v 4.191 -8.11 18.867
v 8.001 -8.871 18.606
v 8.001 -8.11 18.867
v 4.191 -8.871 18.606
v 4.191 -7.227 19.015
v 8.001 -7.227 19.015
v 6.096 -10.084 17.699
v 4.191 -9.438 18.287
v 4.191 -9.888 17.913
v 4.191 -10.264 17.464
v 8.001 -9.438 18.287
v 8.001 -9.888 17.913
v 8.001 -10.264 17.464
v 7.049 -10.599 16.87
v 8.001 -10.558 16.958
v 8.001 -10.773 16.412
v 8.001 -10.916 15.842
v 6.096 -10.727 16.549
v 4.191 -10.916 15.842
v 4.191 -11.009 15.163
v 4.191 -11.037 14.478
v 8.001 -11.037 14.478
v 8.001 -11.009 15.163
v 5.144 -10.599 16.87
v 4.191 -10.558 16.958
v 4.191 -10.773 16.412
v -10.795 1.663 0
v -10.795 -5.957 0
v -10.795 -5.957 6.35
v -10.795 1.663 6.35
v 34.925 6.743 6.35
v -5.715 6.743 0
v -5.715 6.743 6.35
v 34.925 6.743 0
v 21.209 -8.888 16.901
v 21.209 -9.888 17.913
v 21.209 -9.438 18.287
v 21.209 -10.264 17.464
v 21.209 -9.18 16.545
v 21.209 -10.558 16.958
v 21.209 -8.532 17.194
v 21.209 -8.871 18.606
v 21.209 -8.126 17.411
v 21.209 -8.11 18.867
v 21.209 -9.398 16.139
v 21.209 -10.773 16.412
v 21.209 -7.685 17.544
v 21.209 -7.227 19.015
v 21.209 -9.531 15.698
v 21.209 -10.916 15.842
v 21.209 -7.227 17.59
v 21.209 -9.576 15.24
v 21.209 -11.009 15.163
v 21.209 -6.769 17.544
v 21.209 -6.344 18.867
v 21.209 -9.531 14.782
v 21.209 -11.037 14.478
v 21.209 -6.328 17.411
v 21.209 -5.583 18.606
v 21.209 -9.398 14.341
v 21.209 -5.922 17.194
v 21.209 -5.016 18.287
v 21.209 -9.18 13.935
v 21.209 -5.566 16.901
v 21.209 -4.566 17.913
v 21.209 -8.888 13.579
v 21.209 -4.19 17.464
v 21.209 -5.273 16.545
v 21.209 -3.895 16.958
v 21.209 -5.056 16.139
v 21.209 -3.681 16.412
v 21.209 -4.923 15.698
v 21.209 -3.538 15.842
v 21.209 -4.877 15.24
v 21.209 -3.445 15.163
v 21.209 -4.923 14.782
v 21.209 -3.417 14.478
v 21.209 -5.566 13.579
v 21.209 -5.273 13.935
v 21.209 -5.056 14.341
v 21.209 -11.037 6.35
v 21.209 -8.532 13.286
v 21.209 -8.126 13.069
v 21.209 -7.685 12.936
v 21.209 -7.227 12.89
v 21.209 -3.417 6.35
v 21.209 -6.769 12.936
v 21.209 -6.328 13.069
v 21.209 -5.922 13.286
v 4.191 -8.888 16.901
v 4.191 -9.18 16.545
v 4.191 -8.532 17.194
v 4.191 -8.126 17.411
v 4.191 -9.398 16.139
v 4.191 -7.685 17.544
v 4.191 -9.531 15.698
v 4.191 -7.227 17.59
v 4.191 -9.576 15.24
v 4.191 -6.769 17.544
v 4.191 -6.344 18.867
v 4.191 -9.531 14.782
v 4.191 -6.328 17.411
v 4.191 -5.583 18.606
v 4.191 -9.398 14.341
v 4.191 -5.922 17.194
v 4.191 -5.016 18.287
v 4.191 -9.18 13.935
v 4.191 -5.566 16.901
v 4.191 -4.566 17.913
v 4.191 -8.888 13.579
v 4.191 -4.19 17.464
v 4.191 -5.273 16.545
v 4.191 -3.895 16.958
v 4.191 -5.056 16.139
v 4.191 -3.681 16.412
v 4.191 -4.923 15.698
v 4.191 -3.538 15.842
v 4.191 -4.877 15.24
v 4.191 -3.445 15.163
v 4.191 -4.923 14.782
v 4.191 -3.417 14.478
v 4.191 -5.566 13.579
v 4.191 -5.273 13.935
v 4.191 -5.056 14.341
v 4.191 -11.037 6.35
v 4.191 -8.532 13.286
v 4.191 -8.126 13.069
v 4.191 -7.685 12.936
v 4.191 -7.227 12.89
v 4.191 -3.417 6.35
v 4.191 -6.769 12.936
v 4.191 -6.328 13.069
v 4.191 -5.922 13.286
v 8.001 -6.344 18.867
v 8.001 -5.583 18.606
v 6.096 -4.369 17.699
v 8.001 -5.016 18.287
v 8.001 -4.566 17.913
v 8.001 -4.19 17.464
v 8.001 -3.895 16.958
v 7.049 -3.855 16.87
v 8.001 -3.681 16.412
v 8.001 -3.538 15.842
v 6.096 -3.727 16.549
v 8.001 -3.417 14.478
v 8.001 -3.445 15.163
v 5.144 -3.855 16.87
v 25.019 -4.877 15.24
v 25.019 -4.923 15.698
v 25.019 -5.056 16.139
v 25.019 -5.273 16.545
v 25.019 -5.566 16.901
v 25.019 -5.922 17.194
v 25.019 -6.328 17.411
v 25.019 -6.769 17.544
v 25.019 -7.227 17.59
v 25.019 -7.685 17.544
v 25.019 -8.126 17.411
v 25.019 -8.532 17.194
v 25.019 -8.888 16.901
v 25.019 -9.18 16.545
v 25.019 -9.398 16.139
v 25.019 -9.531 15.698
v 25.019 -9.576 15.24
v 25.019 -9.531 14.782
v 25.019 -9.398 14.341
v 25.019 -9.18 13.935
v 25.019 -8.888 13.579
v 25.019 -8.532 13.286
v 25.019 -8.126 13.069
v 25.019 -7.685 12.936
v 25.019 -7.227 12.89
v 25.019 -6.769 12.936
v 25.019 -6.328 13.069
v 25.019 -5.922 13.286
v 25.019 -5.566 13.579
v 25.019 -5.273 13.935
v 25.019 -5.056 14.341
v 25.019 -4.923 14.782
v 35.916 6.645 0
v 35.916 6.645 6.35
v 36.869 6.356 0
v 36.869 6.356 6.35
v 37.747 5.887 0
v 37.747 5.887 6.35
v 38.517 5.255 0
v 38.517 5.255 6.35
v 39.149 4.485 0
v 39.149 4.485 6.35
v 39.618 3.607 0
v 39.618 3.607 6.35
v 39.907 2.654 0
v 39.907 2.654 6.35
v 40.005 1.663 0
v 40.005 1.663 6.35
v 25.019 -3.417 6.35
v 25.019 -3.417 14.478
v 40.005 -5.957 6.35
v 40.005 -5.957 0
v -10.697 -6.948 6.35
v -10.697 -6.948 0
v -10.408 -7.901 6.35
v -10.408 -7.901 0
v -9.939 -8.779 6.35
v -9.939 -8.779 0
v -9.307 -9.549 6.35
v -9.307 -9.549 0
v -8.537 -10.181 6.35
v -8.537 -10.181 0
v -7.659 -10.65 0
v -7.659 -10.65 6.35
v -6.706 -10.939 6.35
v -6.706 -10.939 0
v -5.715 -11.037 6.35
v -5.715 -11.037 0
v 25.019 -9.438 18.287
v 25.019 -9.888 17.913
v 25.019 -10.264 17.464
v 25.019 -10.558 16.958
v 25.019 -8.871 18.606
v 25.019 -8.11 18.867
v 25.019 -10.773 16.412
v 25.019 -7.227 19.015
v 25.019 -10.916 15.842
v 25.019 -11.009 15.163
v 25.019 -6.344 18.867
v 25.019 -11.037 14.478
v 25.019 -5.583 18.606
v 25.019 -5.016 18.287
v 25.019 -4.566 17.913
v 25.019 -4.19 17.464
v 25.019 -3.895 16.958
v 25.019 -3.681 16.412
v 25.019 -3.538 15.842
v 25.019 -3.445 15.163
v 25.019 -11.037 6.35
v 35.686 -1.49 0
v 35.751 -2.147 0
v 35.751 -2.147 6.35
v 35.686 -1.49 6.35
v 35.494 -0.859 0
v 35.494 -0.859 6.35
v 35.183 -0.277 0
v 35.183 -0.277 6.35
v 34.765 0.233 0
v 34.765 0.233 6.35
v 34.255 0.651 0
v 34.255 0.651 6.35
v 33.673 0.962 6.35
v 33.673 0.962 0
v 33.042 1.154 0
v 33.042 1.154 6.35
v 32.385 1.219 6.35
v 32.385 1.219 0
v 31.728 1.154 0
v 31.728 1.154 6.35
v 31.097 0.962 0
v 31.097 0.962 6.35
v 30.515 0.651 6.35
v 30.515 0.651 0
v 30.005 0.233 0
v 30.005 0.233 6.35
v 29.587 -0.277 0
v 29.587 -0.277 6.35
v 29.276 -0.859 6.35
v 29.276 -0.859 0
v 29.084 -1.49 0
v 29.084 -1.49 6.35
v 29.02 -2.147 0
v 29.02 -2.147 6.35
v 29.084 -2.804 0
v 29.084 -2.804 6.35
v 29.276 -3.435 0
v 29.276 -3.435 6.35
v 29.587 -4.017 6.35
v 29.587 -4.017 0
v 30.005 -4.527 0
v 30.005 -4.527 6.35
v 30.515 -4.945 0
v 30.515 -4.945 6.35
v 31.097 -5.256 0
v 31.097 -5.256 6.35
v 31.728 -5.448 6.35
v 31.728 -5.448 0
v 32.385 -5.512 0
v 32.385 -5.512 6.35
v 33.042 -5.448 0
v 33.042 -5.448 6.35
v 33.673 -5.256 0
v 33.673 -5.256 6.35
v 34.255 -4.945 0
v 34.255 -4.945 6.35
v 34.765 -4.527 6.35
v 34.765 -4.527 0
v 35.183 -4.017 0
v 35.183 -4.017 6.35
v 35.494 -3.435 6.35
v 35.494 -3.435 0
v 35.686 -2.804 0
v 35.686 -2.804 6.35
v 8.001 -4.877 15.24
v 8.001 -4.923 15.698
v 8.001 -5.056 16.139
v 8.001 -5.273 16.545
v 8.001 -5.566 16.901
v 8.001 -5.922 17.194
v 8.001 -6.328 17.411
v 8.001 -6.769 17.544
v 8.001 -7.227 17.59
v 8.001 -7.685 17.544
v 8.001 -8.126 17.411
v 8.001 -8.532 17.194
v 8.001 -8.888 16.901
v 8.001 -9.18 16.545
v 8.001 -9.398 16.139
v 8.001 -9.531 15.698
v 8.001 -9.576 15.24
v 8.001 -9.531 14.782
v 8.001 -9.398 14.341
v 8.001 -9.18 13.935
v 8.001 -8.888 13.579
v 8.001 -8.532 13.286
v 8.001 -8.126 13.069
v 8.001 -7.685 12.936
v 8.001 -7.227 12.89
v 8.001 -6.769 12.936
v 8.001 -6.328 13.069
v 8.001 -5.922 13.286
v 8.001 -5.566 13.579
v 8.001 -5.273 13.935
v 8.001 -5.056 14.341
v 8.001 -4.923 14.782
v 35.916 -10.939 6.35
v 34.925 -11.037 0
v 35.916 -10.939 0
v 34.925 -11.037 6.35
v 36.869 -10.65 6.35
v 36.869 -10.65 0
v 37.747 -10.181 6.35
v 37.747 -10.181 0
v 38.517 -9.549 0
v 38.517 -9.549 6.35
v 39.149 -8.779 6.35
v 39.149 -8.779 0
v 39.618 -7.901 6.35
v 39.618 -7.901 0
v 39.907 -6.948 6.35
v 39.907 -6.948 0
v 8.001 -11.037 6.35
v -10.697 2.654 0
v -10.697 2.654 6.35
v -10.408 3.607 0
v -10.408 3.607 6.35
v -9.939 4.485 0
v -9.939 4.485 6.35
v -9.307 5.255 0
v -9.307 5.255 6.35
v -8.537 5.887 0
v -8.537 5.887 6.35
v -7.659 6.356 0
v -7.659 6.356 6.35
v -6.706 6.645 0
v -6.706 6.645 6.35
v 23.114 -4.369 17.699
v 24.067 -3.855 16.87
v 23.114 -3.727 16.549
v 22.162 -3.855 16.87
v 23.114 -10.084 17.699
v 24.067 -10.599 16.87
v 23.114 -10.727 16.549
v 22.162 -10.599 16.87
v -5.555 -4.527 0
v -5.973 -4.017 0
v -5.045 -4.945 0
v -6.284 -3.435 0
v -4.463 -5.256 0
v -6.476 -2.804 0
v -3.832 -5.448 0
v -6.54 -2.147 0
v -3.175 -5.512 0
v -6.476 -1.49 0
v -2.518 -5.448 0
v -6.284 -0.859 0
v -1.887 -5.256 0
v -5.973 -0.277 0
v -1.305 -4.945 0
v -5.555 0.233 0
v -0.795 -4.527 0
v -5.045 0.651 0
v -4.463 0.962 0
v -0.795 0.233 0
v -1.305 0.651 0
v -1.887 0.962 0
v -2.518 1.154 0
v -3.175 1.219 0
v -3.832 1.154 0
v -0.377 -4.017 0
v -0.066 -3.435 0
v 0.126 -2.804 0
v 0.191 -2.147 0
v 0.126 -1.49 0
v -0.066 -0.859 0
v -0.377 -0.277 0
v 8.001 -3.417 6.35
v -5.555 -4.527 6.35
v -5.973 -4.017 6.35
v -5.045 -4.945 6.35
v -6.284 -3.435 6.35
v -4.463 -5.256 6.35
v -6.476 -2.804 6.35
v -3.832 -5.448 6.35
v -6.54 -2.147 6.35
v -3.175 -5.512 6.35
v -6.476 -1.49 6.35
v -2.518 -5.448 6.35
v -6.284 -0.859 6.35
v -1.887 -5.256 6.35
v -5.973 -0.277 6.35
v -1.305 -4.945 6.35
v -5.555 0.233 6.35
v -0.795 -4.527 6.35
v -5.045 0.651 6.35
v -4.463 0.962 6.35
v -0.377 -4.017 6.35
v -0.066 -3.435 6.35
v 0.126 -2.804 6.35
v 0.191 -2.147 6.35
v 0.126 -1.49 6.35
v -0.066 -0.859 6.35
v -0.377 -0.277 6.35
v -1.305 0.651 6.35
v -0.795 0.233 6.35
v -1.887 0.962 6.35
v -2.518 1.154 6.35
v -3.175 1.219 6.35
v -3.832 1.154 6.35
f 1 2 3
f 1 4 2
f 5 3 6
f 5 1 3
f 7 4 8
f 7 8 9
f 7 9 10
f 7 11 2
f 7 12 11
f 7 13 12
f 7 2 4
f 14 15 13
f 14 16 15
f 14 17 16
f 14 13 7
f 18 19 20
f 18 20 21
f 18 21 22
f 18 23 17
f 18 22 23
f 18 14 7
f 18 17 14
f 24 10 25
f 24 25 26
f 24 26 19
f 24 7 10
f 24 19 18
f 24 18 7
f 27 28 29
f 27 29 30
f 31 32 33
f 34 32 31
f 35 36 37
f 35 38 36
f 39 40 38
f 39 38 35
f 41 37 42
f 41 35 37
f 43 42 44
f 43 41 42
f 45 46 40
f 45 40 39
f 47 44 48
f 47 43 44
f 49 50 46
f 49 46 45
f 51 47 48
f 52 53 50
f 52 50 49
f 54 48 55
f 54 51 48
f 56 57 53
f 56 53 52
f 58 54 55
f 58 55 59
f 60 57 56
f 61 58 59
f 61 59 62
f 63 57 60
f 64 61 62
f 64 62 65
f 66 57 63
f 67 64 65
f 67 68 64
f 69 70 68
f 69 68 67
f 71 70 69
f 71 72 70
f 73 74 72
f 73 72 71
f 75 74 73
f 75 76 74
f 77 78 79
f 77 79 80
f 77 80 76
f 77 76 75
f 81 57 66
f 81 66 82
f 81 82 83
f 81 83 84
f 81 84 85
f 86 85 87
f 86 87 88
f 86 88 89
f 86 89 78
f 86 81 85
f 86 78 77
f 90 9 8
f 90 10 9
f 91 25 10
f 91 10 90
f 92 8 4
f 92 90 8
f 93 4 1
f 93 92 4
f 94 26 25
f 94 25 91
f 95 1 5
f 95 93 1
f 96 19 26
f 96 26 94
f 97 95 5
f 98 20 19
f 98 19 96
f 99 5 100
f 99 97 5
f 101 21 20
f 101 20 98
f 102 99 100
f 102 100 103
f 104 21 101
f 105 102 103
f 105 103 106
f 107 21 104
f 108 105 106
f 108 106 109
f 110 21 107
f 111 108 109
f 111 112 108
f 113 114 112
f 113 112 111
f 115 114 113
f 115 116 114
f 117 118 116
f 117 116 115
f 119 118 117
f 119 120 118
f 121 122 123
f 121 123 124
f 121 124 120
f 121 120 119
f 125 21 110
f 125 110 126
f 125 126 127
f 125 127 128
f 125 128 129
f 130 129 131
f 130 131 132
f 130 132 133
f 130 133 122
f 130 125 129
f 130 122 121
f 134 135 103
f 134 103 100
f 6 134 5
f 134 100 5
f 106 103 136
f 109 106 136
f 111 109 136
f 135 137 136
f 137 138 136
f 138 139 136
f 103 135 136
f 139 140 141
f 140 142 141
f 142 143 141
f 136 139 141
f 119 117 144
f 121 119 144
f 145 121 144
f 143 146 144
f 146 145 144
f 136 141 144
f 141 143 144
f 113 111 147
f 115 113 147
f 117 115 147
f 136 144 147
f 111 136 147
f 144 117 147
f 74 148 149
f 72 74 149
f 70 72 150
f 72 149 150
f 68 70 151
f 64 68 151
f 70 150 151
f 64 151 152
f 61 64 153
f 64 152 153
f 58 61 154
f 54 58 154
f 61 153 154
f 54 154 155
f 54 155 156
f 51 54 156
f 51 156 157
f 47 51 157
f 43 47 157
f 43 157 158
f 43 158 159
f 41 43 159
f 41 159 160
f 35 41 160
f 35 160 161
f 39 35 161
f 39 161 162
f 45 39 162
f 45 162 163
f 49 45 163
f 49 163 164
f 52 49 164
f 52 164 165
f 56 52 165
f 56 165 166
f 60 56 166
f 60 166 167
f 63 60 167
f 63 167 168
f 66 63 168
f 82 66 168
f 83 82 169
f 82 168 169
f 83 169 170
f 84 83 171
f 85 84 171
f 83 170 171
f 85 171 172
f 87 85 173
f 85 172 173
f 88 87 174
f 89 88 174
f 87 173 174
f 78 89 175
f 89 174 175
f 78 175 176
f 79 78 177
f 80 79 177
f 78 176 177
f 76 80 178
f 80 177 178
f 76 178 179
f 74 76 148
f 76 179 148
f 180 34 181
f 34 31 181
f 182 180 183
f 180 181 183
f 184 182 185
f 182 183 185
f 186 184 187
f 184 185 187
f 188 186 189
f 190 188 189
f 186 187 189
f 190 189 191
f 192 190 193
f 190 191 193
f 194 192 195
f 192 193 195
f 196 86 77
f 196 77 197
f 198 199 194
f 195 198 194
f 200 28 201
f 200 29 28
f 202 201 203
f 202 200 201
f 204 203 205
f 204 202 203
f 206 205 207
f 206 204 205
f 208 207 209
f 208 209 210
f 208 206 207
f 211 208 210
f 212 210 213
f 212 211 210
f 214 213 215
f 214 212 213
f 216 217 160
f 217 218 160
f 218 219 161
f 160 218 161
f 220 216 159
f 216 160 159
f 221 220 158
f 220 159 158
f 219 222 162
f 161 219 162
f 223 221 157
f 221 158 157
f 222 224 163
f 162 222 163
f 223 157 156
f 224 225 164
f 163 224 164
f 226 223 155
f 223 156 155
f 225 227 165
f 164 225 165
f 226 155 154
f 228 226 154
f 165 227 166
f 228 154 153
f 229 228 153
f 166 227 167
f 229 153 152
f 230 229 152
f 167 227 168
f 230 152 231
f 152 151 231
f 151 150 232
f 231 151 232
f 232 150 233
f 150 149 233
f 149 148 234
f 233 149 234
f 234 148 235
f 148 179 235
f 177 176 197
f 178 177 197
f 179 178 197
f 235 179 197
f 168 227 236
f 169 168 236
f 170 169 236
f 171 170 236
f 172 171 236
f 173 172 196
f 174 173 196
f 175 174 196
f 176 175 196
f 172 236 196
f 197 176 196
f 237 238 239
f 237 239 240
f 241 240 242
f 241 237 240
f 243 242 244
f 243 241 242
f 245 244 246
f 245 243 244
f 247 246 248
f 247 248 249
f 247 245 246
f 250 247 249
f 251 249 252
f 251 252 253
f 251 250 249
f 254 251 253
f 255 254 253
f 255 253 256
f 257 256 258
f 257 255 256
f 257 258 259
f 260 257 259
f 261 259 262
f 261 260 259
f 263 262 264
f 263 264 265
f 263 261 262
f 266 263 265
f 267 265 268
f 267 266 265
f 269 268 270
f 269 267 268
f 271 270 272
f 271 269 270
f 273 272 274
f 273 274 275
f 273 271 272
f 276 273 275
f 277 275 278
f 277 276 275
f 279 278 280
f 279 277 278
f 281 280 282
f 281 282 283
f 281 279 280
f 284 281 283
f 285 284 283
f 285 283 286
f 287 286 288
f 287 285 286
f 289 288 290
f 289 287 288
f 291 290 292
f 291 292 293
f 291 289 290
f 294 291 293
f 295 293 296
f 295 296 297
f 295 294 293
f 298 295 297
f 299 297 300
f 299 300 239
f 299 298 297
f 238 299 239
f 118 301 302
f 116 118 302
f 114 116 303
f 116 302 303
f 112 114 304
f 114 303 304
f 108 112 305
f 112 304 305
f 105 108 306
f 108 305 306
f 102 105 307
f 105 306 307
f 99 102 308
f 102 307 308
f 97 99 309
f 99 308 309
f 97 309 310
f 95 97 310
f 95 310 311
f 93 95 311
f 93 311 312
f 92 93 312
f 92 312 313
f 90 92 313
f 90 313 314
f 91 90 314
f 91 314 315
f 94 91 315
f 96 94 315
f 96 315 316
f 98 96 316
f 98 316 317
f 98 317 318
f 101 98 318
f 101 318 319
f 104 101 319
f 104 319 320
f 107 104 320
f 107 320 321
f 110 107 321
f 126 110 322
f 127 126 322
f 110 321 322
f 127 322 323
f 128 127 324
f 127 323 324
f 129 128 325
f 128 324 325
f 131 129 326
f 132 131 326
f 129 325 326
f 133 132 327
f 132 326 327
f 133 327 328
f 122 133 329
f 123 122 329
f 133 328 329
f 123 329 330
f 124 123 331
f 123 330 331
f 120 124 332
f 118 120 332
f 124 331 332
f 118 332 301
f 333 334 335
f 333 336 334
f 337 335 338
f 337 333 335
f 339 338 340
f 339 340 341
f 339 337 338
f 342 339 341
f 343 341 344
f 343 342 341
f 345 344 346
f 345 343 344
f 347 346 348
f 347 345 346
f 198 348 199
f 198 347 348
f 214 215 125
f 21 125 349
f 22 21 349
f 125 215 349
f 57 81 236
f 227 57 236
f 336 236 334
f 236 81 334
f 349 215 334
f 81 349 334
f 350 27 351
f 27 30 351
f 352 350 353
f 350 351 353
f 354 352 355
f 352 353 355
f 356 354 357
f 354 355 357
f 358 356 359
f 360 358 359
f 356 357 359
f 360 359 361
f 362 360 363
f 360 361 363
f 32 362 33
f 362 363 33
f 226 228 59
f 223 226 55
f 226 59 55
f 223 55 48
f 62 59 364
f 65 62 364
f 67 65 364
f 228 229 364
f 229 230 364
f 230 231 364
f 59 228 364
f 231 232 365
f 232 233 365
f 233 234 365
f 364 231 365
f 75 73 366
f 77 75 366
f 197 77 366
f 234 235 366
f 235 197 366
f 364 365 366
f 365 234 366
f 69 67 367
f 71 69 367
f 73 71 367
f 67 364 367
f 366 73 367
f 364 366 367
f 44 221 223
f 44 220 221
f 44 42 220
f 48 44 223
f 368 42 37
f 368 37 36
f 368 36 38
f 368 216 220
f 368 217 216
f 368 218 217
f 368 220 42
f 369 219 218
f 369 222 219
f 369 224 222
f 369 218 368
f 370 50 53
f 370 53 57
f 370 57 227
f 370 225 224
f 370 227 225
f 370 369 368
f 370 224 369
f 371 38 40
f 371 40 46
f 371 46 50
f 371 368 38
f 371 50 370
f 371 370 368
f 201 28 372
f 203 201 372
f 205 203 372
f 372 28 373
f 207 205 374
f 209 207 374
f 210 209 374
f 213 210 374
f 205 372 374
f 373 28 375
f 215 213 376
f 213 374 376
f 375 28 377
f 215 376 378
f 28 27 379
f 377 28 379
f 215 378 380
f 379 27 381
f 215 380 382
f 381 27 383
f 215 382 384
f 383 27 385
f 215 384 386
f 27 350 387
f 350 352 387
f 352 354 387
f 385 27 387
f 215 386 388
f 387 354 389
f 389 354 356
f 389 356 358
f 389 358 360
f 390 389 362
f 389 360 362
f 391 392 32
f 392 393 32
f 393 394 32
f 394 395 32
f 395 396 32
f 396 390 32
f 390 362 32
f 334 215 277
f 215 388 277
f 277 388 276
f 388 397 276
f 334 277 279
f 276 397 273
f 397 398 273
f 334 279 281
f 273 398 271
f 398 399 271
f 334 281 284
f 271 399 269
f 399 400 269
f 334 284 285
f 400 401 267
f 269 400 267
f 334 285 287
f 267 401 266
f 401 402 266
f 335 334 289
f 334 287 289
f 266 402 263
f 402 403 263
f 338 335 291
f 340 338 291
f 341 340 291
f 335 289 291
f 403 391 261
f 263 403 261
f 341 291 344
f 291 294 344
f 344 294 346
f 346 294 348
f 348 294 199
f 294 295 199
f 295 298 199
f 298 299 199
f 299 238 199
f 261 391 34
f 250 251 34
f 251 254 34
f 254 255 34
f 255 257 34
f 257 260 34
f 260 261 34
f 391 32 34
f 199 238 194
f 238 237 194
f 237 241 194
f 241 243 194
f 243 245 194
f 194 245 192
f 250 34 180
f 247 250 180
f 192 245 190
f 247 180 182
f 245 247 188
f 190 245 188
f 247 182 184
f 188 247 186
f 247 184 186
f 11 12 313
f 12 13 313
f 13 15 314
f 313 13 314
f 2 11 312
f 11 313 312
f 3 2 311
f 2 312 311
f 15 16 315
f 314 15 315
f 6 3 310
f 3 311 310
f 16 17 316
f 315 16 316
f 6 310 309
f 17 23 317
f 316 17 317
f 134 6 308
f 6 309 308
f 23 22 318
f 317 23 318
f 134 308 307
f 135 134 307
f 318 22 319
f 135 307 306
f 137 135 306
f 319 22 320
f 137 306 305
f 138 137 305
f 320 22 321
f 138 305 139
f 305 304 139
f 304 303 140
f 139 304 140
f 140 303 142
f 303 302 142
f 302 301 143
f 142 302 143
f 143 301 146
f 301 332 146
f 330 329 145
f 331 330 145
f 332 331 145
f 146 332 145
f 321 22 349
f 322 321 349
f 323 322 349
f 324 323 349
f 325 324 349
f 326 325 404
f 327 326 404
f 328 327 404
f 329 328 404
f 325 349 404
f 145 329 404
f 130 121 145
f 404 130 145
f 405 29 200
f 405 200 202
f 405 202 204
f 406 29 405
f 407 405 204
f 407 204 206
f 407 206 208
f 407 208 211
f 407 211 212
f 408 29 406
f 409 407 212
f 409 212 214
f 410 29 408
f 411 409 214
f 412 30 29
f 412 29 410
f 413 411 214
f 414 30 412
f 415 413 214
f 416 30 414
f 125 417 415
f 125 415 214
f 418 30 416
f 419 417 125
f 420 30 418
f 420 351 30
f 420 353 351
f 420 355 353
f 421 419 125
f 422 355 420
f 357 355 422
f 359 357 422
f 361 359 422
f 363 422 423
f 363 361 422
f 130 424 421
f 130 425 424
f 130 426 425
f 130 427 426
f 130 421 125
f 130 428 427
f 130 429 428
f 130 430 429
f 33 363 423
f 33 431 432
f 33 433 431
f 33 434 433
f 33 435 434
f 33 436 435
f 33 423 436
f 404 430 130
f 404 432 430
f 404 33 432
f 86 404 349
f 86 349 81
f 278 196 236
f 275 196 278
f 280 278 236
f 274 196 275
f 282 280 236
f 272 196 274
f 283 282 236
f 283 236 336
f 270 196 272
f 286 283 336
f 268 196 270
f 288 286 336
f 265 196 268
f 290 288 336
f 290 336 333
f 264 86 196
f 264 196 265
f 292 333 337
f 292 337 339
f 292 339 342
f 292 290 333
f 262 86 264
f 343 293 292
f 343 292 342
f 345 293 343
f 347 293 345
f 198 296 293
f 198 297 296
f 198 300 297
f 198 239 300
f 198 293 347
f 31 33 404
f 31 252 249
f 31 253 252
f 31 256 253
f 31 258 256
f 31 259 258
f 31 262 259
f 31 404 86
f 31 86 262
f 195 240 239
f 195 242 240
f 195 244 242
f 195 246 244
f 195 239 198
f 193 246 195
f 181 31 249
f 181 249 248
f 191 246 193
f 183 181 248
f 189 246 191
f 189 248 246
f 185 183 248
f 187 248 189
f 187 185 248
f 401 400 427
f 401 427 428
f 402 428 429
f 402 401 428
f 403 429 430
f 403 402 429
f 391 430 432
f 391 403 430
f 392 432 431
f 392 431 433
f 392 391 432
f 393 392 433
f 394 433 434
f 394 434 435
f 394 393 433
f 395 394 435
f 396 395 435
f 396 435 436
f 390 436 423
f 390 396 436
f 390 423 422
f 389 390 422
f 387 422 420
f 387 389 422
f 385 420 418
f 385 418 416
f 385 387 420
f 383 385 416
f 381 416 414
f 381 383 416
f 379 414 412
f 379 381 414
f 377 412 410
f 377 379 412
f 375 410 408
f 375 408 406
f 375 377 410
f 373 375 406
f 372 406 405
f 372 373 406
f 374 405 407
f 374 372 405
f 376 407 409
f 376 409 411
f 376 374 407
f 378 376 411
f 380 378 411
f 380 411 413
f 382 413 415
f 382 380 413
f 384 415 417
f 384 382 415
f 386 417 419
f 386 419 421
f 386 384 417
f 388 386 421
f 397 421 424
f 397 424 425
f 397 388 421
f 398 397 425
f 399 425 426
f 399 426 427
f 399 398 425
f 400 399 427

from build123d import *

# Parameters (mm, degrees)
F0_W        = 50.8
F0_H        = 17.78
F0_R        = 3.3655
F1_DEPTH    = 6.35
F2_R        = 5.08
F3_W        = 3.81
F3_H        = 7.62
F4_DEPTH    = 12.7
F5_R        = 2.3495
F6_DEPTH    = 25.4
F7_T1_DEPTH = 26.67
F7_T3_DEPTH = 26.67


# Not quite as in the source:
# - a fillet or chamfer that OpenCascade refuses, or shapes differently, is made with other operations: its cross-section is extruded or revolved along the edge and cut away or added


with BuildPart() as f1:
    # F0 (on Top) → F1 (new body)
    with BuildSketch(Plane.XY):
        with Locations((14.6050021708, -2.1469597467)):
            Rectangle(F0_W, F0_H)
        with Locations((-3.1749978292, -2.1469597467)):
            Circle(F0_R, mode=Mode.SUBTRACT)
        with Locations((32.3850021708, -2.1469597467)):
            Circle(F0_R, mode=Mode.SUBTRACT)
    extrude(amount=F1_DEPTH)

    # F2
    f2_edges = [f1.edges().sort_by_distance(p)[0] for p in [
        (40.005002, -11.03696, 3.175),
        (40.005002, 6.74304, 3.175),
        (-10.794998, -11.03696, 3.175),
        (-10.794998, 6.74304, 3.175),
    ]]
    fillet(f2_edges, radius=F2_R)

    # F3 (on face) → F4 (join)
    with BuildSketch(Plane.XY.offset(6.35)):
        with Locations((6.0960021708, -7.2269597467)):
            Rectangle(F3_W, F3_H)
        with Locations((23.1140021708, -7.2269597467)):
            Rectangle(F3_W, F3_H)
    extrude(amount=F4_DEPTH)

    # F5 (on face) → F6 (cut)
    with BuildSketch(Plane.YZ.offset(25.0190021708)):
        with Locations((-7.2269597467, 15.24)):
            Circle(F5_R)
    extrude(amount=-F6_DEPTH, mode=Mode.SUBTRACT)

    # F7: fillet of radius 4.572 on 4 edges, made by hand

    # F7_s2 → F7_t1 (cut)
    with BuildSketch(Plane.YZ.offset(-7.2389978292)):
        with BuildLine():
            add(Edge.make_bspline(
                [(-11.0369597467, 14.478), (-11.0369597467, 19.05), (-6.4649597467, 19.05)],
                knots=[0, 0, 0, 1, 1, 1], degree=2, weights=[1, 1, 1]))
            Line((-6.4649597467, 19.05), (-11.0369597467, 19.05))
            Line((-11.0369597467, 19.05), (-11.0369597467, 14.478))
        make_face()
        with BuildLine():
            add(Edge.make_bspline(
                [(-3.4169597467, 14.478), (-3.4169597467, 19.05), (-7.9889597467, 19.05)],
                knots=[0, 0, 0, 1, 1, 1], degree=2, weights=[1, 1, 1]))
            Line((-7.9889597467, 19.05), (-3.4169597467, 19.05))
            Line((-3.4169597467, 19.05), (-3.4169597467, 14.478))
        make_face()
    extrude(amount=F7_T1_DEPTH, mode=Mode.SUBTRACT)

    # F7_s4 → F7_t3 (cut)
    with BuildSketch(Plane.YZ.offset(9.7790021708)):
        with BuildLine():
            add(Edge.make_bspline(
                [(-11.0369597467, 14.478), (-11.0369597467, 19.05), (-6.4649597467, 19.05)],
                knots=[0, 0, 0, 1, 1, 1], degree=2, weights=[1, 1, 1]))
            Line((-6.4649597467, 19.05), (-11.0369597467, 19.05))
            Line((-11.0369597467, 19.05), (-11.0369597467, 14.478))
        make_face()
        with BuildLine():
            add(Edge.make_bspline(
                [(-3.4169597467, 14.478), (-3.4169597467, 19.05), (-7.9889597467, 19.05)],
                knots=[0, 0, 0, 1, 1, 1], degree=2, weights=[1, 1, 1]))
            Line((-7.9889597467, 19.05), (-3.4169597467, 19.05))
            Line((-3.4169597467, 19.05), (-3.4169597467, 14.478))
        make_face()
    extrude(amount=F7_T3_DEPTH, mode=Mode.SUBTRACT)


solid = f1.part
